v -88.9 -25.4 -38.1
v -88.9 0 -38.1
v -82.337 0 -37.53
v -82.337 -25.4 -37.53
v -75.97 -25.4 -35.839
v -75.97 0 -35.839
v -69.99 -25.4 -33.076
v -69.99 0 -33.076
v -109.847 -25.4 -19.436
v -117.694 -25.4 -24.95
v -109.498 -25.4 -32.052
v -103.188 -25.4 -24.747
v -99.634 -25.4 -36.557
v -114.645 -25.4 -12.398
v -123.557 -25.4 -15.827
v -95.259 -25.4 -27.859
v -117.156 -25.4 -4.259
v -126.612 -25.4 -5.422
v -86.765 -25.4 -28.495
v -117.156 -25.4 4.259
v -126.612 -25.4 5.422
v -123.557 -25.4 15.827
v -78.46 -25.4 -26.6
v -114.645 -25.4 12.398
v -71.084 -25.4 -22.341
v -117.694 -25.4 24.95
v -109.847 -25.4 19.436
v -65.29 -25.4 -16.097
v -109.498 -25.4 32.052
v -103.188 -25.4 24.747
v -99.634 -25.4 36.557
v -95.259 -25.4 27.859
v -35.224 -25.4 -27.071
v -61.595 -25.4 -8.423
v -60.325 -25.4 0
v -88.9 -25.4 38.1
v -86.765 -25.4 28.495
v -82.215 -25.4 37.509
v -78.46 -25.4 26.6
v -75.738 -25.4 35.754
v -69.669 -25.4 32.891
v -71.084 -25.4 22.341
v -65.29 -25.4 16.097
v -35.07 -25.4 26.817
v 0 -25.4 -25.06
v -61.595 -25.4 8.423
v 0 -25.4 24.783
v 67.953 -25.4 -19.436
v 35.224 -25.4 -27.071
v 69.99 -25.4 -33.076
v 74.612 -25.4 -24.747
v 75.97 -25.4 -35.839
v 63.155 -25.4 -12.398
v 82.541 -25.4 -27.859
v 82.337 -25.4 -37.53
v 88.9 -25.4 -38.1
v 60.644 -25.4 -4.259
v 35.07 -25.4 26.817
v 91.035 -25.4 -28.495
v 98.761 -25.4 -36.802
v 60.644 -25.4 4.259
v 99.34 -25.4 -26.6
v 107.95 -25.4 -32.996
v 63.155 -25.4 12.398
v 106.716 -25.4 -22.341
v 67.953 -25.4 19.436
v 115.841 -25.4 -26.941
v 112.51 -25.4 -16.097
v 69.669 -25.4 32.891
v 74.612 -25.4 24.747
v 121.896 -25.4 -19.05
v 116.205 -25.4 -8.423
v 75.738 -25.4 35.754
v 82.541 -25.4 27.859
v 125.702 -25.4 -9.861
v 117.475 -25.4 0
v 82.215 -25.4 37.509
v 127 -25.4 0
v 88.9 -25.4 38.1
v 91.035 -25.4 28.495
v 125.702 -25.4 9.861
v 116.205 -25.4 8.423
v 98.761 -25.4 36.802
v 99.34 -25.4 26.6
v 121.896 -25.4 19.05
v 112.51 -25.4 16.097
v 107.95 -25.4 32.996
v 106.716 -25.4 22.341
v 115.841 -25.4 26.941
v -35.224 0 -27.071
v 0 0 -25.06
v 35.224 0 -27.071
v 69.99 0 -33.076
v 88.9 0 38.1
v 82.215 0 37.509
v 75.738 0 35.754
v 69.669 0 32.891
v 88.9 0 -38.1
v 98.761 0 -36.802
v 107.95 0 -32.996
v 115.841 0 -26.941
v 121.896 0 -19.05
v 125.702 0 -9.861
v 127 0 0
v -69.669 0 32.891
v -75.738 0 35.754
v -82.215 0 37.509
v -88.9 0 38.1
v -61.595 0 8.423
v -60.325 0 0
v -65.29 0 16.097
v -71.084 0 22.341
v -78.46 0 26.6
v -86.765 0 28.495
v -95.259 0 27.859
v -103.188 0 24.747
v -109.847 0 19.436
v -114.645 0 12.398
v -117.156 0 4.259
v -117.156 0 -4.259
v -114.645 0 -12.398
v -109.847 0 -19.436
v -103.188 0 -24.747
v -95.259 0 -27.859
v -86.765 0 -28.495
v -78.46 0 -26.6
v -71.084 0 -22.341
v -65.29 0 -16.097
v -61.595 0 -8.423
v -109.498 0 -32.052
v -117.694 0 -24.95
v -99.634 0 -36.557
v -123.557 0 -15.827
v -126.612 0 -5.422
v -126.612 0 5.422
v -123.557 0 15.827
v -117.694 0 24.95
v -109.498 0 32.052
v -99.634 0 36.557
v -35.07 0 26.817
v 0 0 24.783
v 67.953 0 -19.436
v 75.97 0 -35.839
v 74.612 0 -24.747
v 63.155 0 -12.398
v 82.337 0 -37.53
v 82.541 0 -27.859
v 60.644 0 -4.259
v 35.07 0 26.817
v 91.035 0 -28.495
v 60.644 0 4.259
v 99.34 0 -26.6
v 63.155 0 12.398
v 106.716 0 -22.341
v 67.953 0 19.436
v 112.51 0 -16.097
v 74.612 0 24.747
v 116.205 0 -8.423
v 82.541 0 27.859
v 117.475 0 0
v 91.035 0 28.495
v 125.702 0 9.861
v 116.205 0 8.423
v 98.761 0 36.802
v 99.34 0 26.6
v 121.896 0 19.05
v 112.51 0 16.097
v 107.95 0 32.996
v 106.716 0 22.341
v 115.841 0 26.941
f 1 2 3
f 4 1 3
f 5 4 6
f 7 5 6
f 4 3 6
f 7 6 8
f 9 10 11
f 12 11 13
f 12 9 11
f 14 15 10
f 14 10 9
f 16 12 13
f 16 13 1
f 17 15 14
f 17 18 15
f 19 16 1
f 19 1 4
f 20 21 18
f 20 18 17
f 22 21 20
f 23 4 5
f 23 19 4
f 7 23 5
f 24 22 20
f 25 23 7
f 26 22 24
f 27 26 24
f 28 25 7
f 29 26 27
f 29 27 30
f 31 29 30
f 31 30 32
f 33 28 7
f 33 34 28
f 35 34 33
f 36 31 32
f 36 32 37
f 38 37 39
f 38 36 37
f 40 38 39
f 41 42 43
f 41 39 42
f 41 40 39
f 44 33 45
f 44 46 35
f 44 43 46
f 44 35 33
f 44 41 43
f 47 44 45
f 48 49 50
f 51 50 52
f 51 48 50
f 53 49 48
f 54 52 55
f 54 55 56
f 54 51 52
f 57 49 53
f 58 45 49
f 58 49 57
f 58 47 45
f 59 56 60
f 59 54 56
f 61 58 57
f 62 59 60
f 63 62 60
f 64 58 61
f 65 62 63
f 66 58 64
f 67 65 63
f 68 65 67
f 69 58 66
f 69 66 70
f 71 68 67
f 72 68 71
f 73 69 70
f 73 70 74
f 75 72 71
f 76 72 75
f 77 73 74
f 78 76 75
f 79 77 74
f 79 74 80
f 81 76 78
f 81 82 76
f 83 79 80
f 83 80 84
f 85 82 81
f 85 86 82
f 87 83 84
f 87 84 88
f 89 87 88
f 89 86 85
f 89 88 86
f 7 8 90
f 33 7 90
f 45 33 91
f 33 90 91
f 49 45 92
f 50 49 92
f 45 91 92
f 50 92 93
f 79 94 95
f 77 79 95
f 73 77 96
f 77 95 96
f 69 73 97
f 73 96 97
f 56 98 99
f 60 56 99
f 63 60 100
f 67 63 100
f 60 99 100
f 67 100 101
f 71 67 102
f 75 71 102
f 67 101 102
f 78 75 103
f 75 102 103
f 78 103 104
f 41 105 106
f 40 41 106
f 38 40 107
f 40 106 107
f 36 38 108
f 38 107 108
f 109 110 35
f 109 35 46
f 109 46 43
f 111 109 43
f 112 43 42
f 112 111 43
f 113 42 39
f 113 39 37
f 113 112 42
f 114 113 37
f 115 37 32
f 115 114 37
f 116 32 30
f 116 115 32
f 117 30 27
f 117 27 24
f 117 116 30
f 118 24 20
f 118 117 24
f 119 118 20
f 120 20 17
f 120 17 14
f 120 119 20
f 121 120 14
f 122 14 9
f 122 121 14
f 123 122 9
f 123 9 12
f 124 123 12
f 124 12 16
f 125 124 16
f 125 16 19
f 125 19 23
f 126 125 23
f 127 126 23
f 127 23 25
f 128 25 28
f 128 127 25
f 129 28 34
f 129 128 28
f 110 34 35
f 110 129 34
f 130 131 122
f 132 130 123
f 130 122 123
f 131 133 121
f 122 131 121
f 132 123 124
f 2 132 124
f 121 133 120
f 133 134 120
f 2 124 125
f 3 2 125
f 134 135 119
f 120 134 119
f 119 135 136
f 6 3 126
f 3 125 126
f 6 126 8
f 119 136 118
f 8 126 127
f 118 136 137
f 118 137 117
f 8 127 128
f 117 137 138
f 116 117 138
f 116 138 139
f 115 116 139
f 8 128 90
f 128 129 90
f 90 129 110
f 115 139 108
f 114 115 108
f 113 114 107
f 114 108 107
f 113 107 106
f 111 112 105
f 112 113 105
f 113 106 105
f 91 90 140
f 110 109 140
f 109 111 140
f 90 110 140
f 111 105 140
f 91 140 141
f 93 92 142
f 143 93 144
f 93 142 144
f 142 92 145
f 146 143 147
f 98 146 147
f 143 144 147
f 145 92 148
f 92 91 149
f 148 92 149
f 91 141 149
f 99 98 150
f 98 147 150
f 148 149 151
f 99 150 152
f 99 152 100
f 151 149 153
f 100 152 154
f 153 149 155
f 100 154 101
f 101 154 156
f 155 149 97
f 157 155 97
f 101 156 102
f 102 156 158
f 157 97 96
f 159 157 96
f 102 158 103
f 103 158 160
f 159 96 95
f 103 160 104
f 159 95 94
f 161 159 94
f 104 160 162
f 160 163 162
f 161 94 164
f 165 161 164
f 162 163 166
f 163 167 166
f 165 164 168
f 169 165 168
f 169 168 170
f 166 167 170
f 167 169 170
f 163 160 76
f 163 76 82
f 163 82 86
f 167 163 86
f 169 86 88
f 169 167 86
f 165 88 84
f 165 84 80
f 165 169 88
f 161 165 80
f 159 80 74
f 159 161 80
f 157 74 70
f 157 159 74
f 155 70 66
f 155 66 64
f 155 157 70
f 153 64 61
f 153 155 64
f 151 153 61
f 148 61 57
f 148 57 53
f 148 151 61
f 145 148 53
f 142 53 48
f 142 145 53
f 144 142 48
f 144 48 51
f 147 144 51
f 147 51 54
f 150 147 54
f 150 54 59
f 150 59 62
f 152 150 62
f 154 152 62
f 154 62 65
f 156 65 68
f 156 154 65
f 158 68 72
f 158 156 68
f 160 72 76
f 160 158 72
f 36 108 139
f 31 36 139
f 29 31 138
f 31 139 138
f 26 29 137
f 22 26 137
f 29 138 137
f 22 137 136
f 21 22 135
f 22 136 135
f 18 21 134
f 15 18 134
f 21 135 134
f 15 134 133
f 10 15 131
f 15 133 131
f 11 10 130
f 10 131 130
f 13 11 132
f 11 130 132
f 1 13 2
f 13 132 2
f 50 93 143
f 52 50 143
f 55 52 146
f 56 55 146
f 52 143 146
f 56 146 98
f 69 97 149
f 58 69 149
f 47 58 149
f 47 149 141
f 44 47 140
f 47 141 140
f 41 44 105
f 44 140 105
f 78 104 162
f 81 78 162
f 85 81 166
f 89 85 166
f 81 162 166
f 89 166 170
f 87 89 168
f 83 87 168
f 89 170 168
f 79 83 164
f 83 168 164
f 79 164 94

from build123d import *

# Parameters (mm, degrees)
F0_R     = 28.575
F1_DEPTH = 25.4


with BuildPart() as f1:
    # F0 (on Front) → F1 (new body)
    with BuildSketch(Plane.XZ):
        with BuildLine():
            ThreePointArc((-69.669226, 32.890535), (-79.327388, 35.337363), (-88.9, 38.1))
            ThreePointArc((-88.9, 38.1), (-127, 0), (-88.9, -38.1))
            ThreePointArc((-88.9, -38.1), (-79.484753, -35.438589), (-69.9901, -33.076059))
            ThreePointArc((-69.9901, -33.076059), (-55.9449, -19.119922), (-50.8, 0))
            ThreePointArc((-50.8, 0), (-55.852288, 18.959397), (-69.669226, 32.890535))
        make_face()
        with Locations((-88.9, 0)):
            Circle(F0_R, mode=Mode.SUBTRACT)
        with BuildLine():
            ThreePointArc((-69.669226, 32.890535), (-78.938057, 36.77458), (-88.9, 38.1))
            ThreePointArc((-88.9, 38.1), (-79.327388, 35.337363), (-69.669226, 32.890535))
        make_face()
        with BuildLine():
            ThreePointArc((-69.9901, -33.076059), (-79.484753, -35.438589), (-88.9, -38.1))
            ThreePointArc((-88.9, -38.1), (-79.117052, -36.822601), (-69.9901, -33.076059))
        make_face()
        with BuildLine():
            ThreePointArc((69.669226, 32.890535), (0, 24.782982), (-69.669226, 32.890535))
            ThreePointArc((-69.669226, 32.890535), (-55.852288, 18.959397), (-50.8, 0))
            ThreePointArc((-50.8, 0), (-55.9449, -19.119922), (-69.9901, -33.076059))
            ThreePointArc((-69.9901, -33.076059), (0, -25.059942), (69.9901, -33.076059))
            ThreePointArc((69.9901, -33.076059), (50.800451, -0.185323), (69.669226, 32.890535))
        make_face()
        with BuildLine():
            ThreePointArc((88.9, 38.1), (79.327388, 35.337363), (69.669226, 32.890535))
            ThreePointArc((69.669226, 32.890535), (50.800451, -0.185323), (69.9901, -33.076059))
            ThreePointArc((69.9901, -33.076059), (79.484753, -35.438589), (88.9, -38.1))
            ThreePointArc((88.9, -38.1), (115.840768, -26.940768), (127, 0))
            ThreePointArc((127, 0), (115.840768, 26.940768), (88.9, 38.1))
        make_face()
        with Locations((88.9, 0)):
            Circle(F0_R, mode=Mode.SUBTRACT)
        with BuildLine():
            ThreePointArc((88.9, 38.1), (78.938057, 36.77458), (69.669226, 32.890535))
            ThreePointArc((69.669226, 32.890535), (79.327388, 35.337363), (88.9, 38.1))
        make_face()
        with BuildLine():
            ThreePointArc((88.9, -38.1), (79.484753, -35.438589), (69.9901, -33.076059))
            ThreePointArc((69.9901, -33.076059), (79.117052, -36.822601), (88.9, -38.1))
        make_face()
    extrude(amount=F1_DEPTH)


solid = f1.part
